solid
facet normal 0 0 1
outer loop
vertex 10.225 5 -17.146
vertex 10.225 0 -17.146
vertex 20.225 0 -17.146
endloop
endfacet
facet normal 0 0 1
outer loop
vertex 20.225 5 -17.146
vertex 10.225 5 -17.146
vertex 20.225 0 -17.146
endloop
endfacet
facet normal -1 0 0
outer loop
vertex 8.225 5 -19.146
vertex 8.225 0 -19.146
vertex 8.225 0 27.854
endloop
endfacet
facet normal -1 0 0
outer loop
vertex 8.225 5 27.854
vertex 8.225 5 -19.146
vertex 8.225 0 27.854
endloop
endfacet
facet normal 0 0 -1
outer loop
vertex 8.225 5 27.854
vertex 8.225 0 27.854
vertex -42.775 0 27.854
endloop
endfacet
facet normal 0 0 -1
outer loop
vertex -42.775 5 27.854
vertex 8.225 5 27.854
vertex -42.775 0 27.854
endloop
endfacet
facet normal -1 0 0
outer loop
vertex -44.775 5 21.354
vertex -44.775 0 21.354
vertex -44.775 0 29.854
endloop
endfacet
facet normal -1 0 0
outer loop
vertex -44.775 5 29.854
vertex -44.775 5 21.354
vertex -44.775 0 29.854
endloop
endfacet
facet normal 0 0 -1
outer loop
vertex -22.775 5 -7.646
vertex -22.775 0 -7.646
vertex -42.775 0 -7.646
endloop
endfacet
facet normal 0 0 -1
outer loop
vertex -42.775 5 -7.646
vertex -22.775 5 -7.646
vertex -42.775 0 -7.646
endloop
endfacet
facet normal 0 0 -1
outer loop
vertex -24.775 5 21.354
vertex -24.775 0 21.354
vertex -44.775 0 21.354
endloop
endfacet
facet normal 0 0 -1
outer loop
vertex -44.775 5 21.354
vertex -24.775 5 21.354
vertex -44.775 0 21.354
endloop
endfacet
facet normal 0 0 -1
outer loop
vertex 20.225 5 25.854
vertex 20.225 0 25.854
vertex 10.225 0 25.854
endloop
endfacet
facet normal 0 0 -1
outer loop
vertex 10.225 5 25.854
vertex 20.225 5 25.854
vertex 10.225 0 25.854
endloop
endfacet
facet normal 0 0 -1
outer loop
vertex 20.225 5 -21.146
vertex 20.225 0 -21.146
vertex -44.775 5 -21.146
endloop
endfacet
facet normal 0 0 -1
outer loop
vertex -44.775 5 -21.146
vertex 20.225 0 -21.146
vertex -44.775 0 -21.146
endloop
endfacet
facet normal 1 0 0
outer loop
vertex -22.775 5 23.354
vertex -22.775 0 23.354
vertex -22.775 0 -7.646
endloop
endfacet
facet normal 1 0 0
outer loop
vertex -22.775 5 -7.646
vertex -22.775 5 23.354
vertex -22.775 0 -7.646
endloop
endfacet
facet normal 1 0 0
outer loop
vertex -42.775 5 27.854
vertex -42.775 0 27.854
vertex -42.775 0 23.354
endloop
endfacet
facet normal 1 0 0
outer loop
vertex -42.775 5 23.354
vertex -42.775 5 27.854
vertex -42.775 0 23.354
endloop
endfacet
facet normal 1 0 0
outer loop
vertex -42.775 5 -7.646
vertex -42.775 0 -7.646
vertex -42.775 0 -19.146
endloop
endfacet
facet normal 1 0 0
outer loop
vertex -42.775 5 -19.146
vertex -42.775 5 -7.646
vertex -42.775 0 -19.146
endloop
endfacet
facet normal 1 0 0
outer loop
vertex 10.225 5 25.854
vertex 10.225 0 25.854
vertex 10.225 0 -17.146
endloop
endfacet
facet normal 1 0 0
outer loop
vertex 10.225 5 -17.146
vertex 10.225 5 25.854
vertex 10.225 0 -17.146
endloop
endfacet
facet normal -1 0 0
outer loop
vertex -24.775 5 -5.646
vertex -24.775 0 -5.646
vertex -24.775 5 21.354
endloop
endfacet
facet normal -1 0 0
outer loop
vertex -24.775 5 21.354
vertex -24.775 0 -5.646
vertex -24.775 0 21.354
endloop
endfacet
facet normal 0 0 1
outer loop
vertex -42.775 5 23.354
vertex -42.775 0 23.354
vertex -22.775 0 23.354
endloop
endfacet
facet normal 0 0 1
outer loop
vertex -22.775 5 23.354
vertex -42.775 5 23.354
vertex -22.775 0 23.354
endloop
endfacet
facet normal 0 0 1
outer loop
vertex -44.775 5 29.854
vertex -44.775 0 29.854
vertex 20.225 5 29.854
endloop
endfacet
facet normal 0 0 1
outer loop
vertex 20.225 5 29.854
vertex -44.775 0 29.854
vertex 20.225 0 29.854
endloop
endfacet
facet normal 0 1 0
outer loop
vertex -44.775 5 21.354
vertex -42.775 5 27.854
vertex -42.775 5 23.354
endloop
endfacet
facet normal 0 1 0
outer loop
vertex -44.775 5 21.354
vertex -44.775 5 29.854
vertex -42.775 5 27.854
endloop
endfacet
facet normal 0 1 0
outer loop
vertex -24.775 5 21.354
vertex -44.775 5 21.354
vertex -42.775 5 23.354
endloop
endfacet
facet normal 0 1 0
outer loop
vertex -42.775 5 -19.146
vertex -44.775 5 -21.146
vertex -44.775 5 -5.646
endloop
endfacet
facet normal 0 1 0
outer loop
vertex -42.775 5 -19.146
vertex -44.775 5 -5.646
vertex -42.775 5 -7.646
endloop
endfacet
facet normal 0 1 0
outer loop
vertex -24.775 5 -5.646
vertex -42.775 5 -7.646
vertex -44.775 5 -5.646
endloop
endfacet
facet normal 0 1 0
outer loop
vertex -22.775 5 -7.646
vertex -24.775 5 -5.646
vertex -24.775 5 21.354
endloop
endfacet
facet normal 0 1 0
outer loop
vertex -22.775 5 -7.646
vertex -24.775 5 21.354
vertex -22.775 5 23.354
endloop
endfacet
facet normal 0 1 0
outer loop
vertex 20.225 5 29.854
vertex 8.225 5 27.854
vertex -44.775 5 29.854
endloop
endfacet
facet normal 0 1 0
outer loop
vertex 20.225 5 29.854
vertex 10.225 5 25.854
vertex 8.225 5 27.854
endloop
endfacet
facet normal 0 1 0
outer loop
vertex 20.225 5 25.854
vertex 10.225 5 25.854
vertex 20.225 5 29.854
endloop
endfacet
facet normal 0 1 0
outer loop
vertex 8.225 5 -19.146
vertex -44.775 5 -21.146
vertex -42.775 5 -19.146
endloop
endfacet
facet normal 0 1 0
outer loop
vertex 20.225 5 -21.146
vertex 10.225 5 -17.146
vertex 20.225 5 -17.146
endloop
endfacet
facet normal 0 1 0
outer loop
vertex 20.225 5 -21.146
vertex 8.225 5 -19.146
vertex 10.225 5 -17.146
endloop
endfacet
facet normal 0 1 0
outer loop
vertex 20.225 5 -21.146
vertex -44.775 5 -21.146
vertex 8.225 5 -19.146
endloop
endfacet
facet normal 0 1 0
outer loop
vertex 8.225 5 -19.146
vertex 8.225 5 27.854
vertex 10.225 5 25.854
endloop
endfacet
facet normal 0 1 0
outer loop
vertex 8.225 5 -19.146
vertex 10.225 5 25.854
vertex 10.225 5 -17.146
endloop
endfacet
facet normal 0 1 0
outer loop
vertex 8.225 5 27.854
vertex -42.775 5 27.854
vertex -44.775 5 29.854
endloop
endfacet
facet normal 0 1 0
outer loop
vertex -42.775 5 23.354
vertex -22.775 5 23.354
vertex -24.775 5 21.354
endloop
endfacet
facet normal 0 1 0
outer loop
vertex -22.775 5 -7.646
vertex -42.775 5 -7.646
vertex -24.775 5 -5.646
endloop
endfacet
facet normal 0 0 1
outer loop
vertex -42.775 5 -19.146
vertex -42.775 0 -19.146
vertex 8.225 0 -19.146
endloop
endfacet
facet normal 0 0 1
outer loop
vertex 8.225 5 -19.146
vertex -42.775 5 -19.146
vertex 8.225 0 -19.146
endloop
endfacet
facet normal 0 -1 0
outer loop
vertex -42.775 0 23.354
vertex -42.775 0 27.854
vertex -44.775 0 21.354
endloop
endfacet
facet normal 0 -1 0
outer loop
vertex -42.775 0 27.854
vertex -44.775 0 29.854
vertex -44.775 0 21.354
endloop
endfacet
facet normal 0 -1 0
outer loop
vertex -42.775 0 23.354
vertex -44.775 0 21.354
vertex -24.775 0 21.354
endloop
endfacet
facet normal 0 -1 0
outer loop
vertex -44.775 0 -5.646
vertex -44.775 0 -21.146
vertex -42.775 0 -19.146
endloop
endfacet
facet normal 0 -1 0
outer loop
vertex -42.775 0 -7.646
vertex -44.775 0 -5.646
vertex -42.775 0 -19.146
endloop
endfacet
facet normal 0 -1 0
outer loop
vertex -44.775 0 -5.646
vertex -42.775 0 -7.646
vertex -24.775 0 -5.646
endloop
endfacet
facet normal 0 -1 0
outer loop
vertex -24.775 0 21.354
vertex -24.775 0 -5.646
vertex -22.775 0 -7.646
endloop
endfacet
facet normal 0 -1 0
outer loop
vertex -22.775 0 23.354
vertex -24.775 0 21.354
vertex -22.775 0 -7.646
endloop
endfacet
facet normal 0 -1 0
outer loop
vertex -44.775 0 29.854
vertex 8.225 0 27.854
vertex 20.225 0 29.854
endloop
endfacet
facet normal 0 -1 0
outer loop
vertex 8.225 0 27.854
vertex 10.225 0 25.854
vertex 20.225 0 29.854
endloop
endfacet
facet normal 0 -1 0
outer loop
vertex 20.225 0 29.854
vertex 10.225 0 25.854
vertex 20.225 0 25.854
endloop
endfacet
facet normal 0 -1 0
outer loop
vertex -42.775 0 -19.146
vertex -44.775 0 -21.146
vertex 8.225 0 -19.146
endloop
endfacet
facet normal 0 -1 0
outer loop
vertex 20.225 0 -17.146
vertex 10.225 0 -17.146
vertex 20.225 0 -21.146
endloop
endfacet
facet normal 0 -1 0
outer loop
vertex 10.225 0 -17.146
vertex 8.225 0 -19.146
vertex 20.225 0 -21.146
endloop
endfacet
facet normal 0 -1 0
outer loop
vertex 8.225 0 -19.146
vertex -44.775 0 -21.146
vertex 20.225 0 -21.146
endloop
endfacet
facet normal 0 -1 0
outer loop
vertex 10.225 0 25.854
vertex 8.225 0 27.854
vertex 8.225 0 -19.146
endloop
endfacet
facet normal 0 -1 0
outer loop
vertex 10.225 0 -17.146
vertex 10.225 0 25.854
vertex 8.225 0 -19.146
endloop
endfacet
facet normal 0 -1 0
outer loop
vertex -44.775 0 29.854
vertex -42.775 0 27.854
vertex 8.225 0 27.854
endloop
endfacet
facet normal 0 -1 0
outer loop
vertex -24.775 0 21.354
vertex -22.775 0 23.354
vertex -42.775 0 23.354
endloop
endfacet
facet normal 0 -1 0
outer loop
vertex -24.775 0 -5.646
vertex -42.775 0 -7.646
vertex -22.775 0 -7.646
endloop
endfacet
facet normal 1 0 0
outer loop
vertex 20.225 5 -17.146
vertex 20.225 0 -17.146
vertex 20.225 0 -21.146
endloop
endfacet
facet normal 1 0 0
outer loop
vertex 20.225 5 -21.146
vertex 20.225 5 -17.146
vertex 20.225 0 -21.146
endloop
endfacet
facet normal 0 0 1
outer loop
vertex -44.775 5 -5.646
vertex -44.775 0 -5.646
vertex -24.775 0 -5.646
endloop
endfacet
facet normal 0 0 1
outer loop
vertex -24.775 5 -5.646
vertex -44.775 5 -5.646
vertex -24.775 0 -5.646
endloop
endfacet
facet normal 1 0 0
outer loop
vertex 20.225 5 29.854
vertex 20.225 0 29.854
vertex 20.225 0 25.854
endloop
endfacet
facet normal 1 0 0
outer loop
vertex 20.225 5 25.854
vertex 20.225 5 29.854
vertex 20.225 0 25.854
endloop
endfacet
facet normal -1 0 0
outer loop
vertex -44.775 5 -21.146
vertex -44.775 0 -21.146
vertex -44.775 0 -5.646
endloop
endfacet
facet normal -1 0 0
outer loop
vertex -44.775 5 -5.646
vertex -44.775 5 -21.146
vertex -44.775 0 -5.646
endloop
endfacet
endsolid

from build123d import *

# Parameters (mm, degrees)
EXTRUDE_4_DEPTH = 5


with BuildPart() as part:
    # 草图1 → 凸台-拉伸4 (new body)
    with BuildSketch(Plane(origin=(0, 0, 0), x_dir=(1, 0, 0), z_dir=(0, 1, 0))):
        Polygon((-44.775072214, 5.646396396), (-24.775072214, 5.646396396), (-24.775072214, -21.353603604), (-44.775072214, -21.353603604), (-44.775072214, -29.853603604), (20.224927786, -29.853603604), (20.224927786, -25.853603604), (10.224927786, -25.853603604), (10.224927786, 17.146396396), (20.224927786, 17.146396396), (20.224927786, 21.146396396), (-44.775072214, 21.146396396), align=None)
        Polygon((-42.775072214, 19.146396396), (8.224927786, 19.146396396), (8.224927786, -27.853603604), (-42.775072214, -27.853603604), (-42.775072214, -23.353603604), (-22.775072214, -23.353603604), (-22.775072214, 7.646396396), (-42.775072214, 7.646396396), align=None, mode=Mode.SUBTRACT)
    extrude(amount=EXTRUDE_4_DEPTH)


solid = part.part
